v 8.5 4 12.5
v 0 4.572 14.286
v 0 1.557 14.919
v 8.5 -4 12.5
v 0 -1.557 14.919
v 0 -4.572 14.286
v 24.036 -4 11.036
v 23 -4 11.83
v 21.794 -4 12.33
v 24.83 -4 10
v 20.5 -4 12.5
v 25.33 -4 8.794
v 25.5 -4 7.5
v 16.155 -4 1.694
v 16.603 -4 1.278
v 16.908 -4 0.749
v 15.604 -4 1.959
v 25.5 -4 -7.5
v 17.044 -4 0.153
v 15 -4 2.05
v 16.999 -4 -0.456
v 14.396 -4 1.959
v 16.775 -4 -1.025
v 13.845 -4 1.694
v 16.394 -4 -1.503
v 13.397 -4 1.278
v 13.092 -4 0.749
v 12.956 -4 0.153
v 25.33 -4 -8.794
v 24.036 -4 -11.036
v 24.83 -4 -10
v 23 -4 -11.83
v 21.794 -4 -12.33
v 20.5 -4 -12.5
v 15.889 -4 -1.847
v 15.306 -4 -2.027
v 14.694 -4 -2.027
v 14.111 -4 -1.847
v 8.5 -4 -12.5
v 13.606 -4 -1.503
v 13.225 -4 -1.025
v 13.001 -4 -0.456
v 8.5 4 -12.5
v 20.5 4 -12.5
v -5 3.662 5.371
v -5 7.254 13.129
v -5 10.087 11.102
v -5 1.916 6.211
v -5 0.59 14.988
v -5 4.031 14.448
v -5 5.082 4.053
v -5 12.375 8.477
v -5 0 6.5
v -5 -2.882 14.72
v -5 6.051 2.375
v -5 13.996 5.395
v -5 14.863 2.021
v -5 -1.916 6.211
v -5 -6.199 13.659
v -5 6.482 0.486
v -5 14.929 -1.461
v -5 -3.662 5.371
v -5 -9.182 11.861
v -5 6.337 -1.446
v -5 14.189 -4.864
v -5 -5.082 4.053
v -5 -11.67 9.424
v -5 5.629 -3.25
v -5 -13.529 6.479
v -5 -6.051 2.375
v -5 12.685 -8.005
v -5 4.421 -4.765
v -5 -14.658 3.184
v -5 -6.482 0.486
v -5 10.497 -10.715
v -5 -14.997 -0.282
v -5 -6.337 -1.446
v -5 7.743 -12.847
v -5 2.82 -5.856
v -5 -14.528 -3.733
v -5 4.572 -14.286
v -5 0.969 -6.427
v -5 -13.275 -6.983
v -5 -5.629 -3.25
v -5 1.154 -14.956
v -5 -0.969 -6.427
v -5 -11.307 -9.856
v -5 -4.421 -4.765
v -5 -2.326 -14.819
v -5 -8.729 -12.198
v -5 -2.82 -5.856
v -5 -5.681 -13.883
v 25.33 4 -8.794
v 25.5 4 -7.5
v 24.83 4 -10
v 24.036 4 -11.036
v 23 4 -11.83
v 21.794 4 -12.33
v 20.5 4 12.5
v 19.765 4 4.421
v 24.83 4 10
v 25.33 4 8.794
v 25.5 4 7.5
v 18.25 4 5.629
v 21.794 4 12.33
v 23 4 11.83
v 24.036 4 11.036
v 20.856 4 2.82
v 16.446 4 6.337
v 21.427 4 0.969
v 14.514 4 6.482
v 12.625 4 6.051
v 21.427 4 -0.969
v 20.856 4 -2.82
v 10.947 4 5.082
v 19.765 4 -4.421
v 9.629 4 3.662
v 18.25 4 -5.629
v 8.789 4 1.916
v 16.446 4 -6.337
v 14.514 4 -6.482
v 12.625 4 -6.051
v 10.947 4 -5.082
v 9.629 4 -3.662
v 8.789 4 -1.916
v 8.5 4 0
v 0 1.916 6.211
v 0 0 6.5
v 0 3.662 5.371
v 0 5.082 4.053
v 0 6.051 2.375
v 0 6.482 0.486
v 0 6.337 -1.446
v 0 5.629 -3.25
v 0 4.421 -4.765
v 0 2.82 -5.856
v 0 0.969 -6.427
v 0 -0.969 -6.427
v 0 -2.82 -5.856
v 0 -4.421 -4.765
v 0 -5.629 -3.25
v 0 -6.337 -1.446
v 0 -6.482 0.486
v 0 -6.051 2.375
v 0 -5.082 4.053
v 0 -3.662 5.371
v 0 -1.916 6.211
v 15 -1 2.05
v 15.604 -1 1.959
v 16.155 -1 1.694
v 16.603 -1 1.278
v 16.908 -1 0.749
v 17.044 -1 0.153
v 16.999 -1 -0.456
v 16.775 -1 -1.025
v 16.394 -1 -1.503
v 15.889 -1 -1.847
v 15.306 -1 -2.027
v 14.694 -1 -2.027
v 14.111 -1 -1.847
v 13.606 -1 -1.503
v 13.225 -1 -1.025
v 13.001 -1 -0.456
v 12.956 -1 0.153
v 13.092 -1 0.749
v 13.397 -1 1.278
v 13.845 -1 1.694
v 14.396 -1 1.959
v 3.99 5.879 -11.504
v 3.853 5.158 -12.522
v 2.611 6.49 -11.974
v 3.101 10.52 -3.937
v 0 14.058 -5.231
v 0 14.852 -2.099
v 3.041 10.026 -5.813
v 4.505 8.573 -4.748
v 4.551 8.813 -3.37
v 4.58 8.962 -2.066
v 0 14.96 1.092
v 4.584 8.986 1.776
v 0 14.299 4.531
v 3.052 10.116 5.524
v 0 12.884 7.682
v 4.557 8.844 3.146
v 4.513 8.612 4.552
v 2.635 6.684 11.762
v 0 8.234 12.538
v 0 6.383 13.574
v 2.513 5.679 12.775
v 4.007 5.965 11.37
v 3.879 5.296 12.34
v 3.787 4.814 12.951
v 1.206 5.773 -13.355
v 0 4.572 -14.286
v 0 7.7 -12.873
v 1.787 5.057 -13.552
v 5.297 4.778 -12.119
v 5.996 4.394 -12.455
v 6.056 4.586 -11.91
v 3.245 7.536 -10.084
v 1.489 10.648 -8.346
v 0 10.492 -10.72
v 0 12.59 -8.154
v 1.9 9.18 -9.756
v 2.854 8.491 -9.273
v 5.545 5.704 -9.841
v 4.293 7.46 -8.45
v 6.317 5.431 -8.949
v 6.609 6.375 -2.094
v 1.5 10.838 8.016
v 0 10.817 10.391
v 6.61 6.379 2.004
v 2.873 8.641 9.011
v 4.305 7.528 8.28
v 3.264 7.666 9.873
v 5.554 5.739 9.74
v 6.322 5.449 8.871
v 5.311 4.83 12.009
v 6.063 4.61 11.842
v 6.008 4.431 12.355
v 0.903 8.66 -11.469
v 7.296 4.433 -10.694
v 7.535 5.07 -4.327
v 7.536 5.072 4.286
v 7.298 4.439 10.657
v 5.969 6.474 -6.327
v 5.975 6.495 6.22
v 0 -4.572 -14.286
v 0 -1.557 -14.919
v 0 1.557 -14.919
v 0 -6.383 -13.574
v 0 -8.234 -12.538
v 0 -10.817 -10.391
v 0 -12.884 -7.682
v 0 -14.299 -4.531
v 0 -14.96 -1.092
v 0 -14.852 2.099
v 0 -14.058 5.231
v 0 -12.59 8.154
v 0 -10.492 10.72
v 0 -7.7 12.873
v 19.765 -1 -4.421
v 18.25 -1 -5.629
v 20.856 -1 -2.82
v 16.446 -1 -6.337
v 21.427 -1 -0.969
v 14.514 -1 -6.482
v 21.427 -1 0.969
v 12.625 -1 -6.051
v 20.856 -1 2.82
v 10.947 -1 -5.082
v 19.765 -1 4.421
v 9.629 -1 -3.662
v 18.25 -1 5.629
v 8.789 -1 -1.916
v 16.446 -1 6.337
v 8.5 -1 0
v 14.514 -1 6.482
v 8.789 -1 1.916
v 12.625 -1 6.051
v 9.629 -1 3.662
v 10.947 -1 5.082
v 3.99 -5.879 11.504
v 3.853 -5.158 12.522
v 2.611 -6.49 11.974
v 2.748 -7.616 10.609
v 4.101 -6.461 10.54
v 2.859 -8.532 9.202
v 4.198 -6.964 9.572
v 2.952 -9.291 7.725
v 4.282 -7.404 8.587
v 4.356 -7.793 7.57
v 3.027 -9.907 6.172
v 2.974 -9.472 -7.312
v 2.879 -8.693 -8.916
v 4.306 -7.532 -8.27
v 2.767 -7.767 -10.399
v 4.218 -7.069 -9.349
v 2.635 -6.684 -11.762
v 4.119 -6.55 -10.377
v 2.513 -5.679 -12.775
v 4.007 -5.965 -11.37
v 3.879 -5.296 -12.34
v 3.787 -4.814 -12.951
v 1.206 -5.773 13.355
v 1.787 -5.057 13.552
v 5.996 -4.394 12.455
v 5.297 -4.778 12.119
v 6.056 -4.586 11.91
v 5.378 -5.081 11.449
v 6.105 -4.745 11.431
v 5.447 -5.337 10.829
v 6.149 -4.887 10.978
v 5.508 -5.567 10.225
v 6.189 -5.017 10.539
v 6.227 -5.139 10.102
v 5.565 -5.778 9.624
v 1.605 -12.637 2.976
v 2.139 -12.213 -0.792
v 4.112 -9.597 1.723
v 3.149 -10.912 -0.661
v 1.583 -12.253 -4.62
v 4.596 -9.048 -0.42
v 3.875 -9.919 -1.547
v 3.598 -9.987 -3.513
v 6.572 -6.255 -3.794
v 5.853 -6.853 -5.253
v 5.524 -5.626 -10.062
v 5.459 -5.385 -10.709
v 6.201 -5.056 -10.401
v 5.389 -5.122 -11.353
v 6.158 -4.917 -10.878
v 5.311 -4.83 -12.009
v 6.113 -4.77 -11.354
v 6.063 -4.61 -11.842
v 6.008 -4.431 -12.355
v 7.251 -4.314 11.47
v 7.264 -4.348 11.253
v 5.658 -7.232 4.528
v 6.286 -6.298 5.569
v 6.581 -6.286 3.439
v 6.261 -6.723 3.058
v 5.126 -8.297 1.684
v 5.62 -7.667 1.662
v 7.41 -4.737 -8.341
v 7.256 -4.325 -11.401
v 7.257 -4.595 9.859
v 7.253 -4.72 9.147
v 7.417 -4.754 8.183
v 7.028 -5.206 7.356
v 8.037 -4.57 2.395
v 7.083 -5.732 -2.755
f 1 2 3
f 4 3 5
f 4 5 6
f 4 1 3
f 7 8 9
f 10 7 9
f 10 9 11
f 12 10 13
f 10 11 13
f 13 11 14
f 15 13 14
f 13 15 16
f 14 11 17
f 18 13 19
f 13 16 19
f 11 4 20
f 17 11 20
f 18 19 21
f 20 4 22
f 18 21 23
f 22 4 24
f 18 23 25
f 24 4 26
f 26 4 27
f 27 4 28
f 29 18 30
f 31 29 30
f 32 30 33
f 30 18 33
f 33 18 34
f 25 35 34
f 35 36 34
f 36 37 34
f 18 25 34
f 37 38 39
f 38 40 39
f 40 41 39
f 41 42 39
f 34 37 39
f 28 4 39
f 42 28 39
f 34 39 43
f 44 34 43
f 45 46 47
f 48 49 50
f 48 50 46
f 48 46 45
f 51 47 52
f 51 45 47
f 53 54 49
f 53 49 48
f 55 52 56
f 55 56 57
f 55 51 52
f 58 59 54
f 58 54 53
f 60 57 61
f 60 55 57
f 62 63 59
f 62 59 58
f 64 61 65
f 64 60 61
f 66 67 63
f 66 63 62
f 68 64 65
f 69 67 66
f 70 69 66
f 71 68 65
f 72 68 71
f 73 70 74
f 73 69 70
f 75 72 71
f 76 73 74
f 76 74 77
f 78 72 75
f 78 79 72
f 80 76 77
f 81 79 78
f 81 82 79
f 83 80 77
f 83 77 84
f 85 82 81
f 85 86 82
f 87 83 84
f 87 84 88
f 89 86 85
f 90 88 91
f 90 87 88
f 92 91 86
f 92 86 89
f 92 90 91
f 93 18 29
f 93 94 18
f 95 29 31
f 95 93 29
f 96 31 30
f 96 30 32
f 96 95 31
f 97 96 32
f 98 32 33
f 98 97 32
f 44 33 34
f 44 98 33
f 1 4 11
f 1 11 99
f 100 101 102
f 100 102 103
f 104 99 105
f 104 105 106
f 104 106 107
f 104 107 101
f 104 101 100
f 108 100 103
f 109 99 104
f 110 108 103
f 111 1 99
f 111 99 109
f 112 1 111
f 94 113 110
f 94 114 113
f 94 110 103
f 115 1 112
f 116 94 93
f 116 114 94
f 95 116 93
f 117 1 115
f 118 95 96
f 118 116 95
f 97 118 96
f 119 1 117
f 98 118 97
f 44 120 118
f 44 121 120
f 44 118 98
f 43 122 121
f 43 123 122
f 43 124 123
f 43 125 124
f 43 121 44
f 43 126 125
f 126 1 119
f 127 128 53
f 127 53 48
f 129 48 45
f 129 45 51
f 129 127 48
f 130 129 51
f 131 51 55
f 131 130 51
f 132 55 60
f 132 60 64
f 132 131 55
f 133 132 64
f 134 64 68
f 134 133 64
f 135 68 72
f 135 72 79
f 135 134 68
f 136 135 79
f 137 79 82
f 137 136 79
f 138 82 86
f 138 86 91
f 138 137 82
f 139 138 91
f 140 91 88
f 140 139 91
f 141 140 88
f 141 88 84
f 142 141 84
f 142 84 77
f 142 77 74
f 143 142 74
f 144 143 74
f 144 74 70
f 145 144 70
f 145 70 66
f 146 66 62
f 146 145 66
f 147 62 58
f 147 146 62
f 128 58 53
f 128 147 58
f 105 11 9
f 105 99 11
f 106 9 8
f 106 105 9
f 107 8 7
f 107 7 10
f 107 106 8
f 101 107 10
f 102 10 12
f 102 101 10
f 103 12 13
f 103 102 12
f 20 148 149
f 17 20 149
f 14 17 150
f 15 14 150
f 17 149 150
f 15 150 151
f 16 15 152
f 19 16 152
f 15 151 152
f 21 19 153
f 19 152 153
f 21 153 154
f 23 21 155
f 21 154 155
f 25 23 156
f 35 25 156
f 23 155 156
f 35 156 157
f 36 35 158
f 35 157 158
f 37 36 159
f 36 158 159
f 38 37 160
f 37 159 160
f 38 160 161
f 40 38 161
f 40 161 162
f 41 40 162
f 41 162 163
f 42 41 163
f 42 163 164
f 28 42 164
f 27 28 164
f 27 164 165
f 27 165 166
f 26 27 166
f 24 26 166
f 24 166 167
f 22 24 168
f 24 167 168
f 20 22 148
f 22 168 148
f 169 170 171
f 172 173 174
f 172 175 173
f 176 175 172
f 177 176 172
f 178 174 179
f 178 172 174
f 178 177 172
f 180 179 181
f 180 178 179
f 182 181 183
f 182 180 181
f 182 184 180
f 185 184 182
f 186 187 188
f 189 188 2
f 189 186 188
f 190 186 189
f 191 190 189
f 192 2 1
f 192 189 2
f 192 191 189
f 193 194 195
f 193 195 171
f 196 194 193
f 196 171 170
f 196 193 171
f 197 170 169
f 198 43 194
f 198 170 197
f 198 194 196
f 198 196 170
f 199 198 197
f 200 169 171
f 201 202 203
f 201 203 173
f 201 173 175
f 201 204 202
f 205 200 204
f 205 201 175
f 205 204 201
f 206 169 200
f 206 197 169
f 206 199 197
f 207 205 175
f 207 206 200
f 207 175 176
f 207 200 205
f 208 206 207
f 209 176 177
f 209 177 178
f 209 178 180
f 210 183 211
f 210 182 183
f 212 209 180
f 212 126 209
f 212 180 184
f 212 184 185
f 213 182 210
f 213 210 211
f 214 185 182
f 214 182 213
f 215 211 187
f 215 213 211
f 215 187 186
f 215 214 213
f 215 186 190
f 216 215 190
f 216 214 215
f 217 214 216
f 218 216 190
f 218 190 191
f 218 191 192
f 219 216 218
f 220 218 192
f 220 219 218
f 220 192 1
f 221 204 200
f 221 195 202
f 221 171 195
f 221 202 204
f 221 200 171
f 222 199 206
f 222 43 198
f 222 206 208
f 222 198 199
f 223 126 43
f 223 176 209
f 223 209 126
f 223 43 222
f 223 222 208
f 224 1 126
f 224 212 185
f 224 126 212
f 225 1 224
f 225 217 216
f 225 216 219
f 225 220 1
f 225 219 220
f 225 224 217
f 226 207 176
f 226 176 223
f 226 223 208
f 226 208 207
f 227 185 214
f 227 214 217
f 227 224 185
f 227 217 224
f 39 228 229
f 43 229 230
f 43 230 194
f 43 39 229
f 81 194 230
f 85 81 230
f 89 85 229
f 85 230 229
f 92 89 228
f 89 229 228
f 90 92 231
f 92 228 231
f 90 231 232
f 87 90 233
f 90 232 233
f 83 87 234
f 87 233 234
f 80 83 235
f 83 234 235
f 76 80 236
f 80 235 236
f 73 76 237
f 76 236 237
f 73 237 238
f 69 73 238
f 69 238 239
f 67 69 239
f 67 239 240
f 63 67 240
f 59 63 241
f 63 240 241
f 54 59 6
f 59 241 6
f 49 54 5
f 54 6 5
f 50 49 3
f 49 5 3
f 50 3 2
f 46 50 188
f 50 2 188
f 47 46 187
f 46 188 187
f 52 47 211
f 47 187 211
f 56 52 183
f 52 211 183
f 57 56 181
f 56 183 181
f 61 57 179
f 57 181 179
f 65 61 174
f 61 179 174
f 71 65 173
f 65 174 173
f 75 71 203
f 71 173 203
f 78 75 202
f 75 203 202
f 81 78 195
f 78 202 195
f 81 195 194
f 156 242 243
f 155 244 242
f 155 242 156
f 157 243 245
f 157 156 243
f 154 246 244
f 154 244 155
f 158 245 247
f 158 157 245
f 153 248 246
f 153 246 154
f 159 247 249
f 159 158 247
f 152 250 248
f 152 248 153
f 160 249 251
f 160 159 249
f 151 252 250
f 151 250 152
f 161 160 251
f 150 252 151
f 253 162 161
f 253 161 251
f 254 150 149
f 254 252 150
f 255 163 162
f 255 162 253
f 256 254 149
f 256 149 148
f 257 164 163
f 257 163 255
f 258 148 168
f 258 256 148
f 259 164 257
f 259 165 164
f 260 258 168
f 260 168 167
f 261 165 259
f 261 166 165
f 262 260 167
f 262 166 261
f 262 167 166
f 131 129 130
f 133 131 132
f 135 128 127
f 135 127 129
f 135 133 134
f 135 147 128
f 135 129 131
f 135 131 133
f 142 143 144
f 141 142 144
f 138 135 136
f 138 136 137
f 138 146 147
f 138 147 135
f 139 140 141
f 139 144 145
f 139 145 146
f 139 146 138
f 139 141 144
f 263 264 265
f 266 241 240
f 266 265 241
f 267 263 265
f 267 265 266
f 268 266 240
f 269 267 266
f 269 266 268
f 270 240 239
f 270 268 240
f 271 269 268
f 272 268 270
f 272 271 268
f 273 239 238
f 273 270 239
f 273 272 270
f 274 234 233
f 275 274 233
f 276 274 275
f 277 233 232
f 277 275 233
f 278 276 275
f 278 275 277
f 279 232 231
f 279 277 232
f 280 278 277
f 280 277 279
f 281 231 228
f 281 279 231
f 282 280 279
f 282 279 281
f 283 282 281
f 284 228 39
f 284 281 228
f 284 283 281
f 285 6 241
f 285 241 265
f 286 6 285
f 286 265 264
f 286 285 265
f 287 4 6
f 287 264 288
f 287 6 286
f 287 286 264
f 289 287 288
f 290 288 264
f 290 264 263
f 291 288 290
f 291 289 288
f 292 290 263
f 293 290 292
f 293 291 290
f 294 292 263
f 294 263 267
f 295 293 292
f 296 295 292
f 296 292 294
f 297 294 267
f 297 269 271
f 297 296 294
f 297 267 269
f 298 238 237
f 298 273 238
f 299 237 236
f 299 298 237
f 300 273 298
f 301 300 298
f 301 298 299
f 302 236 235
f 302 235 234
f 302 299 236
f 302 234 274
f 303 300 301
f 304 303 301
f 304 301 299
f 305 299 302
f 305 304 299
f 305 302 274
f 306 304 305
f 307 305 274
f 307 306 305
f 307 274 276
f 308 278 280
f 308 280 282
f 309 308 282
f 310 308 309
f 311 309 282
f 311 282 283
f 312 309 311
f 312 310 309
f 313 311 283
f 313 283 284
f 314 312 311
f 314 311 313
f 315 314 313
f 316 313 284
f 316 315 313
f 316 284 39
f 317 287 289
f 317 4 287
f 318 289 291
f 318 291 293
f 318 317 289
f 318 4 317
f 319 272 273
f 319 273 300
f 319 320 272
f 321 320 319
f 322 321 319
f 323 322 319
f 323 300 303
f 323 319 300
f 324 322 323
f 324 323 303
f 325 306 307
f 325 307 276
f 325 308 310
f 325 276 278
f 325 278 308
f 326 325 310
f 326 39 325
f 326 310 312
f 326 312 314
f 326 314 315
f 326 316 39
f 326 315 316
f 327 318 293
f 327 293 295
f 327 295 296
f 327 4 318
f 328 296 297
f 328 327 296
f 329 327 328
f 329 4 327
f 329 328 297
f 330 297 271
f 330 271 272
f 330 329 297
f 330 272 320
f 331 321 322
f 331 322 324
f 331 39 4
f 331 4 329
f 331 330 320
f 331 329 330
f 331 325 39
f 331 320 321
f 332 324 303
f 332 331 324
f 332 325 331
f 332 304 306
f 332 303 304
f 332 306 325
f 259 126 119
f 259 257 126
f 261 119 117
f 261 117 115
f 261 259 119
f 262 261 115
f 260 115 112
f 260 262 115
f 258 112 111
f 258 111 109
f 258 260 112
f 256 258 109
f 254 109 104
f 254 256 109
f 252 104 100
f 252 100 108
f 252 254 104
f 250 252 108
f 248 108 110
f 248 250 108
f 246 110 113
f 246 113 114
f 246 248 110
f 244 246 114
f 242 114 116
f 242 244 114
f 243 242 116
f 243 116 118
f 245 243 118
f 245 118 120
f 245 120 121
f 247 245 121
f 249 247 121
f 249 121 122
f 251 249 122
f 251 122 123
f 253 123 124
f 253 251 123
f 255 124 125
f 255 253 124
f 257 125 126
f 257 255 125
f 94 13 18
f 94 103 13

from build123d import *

# Parameters (mm, degrees)
SKETCH2_3_W             = 25
SKETCH2_3_H             = 8
BOSS_EXTRUDE1_DEPTH     = 17
FILLET2_R               = 5
CUT_EXTRUDE2_DEPTH      = 4
CUT_EXTRUDE2_DEPTH_BACK = 1
SKETCH3_R               = 6.5
SKETCH4_R               = 15
SKETCH4_R_2             = 6.5
BOSS_EXTRUDE2_DEPTH     = 5
SKETCH5_R               = 2.05
CUT_EXTRUDE3_DEPTH      = 3


with BuildPart() as part:
    # Sketch1 for Loft1 → Loft1 section 0
    with BuildSketch(Plane(origin=(0, 0, 0), x_dir=(0, 0, -1), z_dir=(1, 0, 0))):
        with BuildLine():
            # circular arc as an exact rational Bezier (weights 1, cos(half-angle), 1)
            Bezier((-14.286362208, -4.571635907), (0, -49.216517801), (14.286362208, -4.571635907), weights=[1, 0.304775727, 1])
            Bezier((14.286362208, -4.571635907), (15.749285698, 0), (14.286362208, 4.571635907), weights=[1, 0.952424147, 1])
            Bezier((14.286362208, 4.571635907), (0, 49.216517801), (-14.286362208, 4.571635907), weights=[1, 0.304775727, 1])
            Bezier((-14.286362208, 4.571635907), (-15.749285698, 0), (-14.286362208, -4.571635907), weights=[1, 0.952424147, 1])
        make_face()
    # Sketch2 → Loft1 section 1
    with BuildSketch(Plane(origin=(8.5, 0, 0), x_dir=(0, 0, -1), z_dir=(1, 0, 0))):
        with BuildLine():
            Line((-12.5, -4), (12.5, -4))
            Line((12.5, -4), (12.5, 4))
            Line((12.5, 4), (-12.5, 4))
            Line((-12.5, 4), (-12.5, -4))
        make_face()
    loft()

    # Sketch2_3 → Boss-Extrude1 (add)
    with BuildSketch(Plane(origin=(8.5, 0, 0), x_dir=(0, 0, -1), z_dir=(1, 0, 0))):
        Rectangle(SKETCH2_3_W, SKETCH2_3_H)
    extrude(amount=BOSS_EXTRUDE1_DEPTH)

    # Fillet2
    fillet2_edges = [part.edges().sort_by_distance(p)[0] for p in [
        (25.5, 0, 12.5),
        (25.5, 0, -12.5),
    ]]
    fillet(fillet2_edges, radius=FILLET2_R)

    # Sketch3 → Cut-Extrude2 (cut, two sides: drawn at the far end of the back side and taken through both)
    with BuildSketch(Plane(origin=(0, 0, 0), x_dir=(1, 0, 0), z_dir=(0, 1, 0)).offset(-CUT_EXTRUDE2_DEPTH_BACK)):
        with Locations((15, 0)):
            Circle(SKETCH3_R)
    extrude(amount=CUT_EXTRUDE2_DEPTH + CUT_EXTRUDE2_DEPTH_BACK, mode=Mode.SUBTRACT)

    # Sketch4 → Boss-Extrude2 (add)
    with BuildSketch(Plane.ZY):
        Circle(SKETCH4_R)
        Circle(SKETCH4_R_2, mode=Mode.SUBTRACT)
    extrude(amount=BOSS_EXTRUDE2_DEPTH)

    # Sketch5 → Cut-Extrude3 (cut)
    with BuildSketch(Plane(origin=(0, -1, 0), x_dir=(1, 0, 0), z_dir=(0, 1, 0))):
        with Locations((15, 0)):
            Circle(SKETCH5_R)
    extrude(amount=-CUT_EXTRUDE3_DEPTH, mode=Mode.SUBTRACT)


solid = part.part
